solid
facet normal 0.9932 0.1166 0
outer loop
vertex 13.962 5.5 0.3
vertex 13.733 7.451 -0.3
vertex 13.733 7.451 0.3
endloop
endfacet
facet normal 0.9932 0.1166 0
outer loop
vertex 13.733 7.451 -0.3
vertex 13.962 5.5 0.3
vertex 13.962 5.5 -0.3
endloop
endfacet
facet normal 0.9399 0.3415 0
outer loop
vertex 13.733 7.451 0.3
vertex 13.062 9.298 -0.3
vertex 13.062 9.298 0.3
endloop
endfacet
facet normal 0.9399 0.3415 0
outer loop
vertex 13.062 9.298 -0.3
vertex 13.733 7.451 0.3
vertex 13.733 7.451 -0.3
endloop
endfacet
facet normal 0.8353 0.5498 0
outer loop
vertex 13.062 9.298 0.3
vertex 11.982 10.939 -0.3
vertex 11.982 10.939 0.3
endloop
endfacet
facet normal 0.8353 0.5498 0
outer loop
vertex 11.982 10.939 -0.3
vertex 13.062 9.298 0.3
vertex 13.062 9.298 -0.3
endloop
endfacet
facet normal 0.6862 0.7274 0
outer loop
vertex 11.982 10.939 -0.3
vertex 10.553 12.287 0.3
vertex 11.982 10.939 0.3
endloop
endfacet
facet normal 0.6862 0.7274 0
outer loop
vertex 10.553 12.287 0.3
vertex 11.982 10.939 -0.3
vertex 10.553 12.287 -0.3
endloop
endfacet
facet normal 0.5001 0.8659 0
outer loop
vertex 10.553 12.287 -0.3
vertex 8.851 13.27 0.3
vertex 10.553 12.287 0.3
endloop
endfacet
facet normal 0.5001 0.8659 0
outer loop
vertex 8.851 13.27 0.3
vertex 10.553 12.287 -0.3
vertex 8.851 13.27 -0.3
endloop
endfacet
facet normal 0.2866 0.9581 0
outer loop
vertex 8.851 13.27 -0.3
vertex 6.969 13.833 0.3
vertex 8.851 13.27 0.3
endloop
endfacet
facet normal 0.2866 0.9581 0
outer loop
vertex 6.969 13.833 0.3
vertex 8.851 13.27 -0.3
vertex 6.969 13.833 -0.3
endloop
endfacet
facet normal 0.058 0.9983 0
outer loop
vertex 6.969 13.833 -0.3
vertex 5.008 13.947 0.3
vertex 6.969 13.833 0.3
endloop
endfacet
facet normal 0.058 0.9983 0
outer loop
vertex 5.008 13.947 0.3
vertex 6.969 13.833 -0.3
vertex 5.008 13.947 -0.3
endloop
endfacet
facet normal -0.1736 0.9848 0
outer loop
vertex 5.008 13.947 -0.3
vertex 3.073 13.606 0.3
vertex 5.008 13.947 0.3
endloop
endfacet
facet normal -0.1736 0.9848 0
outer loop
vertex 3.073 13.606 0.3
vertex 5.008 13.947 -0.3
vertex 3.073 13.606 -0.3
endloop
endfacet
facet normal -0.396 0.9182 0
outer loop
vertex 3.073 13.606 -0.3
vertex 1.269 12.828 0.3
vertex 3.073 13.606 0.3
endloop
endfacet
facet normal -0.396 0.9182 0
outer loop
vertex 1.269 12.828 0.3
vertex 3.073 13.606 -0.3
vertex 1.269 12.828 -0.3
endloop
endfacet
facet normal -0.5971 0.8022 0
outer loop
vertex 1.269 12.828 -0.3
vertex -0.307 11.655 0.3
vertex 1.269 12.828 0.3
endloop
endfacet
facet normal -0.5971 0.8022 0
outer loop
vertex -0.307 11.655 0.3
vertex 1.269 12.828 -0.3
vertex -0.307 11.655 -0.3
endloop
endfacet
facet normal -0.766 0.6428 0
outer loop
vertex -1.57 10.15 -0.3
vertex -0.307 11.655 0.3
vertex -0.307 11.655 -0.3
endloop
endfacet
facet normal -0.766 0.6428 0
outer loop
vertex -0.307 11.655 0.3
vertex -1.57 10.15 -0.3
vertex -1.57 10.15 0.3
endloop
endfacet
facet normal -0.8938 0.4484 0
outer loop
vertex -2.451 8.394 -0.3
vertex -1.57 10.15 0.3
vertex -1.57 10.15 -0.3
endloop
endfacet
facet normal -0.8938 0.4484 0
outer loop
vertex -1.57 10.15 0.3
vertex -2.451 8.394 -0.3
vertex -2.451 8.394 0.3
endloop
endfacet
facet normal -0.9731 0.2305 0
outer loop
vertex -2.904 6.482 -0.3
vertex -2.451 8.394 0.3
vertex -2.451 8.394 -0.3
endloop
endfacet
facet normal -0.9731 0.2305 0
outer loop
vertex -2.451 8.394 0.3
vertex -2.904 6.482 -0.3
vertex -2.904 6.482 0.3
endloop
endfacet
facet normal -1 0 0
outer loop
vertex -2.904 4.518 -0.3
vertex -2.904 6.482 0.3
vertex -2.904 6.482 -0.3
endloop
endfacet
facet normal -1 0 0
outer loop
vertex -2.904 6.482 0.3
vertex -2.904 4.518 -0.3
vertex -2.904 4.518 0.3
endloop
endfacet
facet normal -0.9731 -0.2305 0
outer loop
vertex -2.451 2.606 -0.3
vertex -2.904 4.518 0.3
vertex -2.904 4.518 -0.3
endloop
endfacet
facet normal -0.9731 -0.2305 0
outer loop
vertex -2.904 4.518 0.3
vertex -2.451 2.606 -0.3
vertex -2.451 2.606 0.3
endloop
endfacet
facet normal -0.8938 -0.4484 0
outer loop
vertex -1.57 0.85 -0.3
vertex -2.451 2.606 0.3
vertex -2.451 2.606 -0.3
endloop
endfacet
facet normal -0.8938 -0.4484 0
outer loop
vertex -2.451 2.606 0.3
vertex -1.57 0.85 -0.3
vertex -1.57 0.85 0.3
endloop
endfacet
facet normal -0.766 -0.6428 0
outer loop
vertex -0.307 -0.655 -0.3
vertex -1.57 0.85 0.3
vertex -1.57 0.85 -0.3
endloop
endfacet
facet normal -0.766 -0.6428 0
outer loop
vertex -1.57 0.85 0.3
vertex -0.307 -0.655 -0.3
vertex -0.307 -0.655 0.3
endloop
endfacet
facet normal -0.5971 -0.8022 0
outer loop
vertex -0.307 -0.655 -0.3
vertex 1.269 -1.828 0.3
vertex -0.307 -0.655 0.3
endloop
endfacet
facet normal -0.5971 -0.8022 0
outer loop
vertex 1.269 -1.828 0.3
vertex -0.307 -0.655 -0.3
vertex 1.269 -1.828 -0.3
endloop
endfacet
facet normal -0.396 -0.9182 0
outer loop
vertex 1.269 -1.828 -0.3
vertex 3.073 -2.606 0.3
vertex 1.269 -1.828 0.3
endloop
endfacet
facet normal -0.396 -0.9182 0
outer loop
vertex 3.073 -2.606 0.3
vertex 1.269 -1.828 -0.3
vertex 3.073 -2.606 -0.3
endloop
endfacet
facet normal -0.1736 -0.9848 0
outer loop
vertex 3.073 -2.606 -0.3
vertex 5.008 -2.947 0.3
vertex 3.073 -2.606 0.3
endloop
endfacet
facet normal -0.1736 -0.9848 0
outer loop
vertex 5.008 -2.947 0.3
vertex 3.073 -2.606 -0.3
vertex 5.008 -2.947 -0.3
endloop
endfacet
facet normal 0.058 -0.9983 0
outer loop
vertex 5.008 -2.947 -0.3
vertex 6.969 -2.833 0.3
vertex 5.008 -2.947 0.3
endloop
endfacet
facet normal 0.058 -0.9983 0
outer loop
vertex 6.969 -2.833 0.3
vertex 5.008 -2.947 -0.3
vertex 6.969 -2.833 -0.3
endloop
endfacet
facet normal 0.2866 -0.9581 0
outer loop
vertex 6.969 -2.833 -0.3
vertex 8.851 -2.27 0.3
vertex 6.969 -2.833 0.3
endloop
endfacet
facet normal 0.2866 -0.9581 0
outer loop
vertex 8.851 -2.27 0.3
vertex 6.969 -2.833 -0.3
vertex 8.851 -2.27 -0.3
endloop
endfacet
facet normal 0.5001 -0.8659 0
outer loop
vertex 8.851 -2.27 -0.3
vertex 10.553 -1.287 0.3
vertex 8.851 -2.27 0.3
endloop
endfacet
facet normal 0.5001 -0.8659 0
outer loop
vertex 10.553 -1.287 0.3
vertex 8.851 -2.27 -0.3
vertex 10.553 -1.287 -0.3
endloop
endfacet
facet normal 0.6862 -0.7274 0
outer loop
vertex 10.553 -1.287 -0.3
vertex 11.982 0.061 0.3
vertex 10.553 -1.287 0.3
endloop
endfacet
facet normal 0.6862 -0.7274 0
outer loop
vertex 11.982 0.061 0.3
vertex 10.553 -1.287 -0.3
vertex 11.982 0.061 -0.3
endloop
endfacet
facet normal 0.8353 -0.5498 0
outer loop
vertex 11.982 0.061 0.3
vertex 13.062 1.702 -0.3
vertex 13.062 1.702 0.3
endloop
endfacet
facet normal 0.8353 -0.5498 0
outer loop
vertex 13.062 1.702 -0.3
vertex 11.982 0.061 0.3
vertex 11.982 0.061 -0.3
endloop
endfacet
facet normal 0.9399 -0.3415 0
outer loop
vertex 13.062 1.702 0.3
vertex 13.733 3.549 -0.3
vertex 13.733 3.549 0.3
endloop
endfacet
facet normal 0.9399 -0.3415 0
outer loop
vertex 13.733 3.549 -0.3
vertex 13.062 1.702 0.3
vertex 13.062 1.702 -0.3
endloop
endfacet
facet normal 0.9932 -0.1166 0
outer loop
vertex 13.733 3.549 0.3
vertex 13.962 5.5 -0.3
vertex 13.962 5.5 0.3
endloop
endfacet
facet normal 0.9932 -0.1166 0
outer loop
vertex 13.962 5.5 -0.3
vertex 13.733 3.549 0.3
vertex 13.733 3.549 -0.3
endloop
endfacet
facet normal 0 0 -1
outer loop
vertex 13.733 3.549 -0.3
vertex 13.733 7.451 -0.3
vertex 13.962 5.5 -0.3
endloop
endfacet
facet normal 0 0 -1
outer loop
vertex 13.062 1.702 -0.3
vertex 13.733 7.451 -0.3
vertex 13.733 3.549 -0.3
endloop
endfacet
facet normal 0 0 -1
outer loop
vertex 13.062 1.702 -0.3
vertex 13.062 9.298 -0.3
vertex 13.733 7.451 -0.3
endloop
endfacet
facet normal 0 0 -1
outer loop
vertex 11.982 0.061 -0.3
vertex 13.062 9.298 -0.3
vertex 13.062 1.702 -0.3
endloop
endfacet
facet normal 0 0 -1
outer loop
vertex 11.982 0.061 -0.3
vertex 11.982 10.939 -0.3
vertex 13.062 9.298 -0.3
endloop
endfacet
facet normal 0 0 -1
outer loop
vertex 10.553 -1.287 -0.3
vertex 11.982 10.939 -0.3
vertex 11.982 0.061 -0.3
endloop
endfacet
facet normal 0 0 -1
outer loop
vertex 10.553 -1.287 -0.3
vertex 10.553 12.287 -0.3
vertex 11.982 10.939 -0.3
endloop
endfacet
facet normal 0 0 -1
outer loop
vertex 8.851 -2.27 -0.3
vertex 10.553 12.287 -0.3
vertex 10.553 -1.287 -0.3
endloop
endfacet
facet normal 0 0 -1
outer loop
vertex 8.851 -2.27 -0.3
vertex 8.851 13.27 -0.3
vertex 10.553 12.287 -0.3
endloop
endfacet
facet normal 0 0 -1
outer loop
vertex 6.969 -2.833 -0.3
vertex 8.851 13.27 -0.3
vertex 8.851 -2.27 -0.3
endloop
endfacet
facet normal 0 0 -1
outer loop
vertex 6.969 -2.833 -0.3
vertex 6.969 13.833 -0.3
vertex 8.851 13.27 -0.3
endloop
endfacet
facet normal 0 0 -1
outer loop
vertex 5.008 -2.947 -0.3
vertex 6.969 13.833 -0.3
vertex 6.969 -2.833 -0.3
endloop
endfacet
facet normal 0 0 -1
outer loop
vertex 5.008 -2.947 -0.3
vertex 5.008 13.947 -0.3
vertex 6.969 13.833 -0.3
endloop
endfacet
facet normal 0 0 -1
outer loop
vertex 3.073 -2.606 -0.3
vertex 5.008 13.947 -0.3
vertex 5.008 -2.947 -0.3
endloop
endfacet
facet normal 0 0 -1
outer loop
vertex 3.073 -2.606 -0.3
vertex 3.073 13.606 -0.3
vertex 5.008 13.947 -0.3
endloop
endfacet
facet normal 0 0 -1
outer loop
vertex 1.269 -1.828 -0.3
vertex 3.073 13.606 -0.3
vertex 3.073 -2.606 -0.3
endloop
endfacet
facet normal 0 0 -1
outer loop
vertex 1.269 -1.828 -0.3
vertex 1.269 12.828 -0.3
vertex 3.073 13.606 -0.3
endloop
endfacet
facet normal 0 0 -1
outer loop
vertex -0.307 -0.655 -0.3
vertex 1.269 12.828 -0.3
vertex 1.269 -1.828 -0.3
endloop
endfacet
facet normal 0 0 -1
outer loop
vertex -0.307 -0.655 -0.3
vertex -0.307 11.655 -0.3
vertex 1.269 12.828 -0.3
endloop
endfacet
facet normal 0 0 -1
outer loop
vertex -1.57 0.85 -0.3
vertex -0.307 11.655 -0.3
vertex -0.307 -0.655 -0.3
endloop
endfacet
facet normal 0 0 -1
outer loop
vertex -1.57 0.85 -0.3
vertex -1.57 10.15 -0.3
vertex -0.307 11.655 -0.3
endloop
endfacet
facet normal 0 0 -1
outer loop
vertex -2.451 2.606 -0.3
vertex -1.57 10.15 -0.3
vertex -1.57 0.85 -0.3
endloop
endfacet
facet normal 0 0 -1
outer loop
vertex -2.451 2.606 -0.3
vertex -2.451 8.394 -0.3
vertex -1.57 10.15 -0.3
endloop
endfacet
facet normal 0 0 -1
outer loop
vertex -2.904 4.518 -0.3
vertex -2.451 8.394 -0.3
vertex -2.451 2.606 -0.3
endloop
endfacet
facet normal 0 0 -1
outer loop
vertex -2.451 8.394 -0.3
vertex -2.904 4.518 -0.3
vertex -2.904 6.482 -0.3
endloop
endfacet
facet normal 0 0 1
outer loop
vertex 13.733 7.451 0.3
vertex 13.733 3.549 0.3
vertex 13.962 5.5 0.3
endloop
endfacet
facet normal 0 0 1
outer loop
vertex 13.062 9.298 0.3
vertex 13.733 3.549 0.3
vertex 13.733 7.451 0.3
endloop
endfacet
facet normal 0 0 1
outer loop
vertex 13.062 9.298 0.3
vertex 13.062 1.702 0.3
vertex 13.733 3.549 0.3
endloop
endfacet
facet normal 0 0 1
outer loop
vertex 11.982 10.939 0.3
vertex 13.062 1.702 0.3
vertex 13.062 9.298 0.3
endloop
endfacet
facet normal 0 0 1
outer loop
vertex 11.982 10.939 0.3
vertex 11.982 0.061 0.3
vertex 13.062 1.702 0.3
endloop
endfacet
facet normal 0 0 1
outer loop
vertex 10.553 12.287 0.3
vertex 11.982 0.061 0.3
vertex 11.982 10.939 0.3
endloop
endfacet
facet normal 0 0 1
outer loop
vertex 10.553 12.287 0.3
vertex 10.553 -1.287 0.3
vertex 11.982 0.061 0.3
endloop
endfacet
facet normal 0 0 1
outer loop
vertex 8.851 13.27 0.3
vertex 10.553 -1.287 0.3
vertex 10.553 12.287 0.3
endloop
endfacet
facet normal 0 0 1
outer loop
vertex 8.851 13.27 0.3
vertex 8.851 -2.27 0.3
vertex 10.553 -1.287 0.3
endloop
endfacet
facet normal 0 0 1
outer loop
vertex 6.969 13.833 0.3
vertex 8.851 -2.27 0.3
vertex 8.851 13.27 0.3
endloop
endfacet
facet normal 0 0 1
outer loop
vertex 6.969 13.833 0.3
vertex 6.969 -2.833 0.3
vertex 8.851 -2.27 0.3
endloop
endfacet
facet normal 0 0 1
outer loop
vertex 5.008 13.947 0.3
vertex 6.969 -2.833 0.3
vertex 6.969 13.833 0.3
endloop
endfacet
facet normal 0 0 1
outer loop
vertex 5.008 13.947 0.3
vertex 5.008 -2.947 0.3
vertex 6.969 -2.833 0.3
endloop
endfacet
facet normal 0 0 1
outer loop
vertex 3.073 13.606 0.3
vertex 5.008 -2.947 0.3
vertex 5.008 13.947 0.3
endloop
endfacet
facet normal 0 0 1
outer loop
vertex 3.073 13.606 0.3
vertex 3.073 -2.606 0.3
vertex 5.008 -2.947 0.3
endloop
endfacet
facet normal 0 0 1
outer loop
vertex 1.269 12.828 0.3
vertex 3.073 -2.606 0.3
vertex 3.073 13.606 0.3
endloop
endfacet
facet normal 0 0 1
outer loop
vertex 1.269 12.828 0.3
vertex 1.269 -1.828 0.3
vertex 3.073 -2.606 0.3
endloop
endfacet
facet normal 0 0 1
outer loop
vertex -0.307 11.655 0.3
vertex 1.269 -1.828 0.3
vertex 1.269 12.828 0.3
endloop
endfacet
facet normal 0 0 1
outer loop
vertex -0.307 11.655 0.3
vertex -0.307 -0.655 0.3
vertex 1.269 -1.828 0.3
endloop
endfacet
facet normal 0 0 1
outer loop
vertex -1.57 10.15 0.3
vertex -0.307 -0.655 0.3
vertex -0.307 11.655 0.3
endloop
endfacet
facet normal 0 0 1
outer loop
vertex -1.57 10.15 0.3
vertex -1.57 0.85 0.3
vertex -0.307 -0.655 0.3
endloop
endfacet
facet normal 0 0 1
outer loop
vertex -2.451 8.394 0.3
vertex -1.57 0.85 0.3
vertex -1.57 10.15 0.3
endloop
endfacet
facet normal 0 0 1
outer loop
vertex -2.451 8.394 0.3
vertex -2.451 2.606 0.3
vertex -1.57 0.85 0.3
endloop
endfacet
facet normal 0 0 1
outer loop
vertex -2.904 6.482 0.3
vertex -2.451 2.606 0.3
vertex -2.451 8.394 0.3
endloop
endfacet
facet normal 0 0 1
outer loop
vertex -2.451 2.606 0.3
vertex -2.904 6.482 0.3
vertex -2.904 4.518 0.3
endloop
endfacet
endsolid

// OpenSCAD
rotate([0,0,0])difference()translate([5.5,5.5,0])  cylinder(r=8.46153846153846,h=0.6, center=true);
